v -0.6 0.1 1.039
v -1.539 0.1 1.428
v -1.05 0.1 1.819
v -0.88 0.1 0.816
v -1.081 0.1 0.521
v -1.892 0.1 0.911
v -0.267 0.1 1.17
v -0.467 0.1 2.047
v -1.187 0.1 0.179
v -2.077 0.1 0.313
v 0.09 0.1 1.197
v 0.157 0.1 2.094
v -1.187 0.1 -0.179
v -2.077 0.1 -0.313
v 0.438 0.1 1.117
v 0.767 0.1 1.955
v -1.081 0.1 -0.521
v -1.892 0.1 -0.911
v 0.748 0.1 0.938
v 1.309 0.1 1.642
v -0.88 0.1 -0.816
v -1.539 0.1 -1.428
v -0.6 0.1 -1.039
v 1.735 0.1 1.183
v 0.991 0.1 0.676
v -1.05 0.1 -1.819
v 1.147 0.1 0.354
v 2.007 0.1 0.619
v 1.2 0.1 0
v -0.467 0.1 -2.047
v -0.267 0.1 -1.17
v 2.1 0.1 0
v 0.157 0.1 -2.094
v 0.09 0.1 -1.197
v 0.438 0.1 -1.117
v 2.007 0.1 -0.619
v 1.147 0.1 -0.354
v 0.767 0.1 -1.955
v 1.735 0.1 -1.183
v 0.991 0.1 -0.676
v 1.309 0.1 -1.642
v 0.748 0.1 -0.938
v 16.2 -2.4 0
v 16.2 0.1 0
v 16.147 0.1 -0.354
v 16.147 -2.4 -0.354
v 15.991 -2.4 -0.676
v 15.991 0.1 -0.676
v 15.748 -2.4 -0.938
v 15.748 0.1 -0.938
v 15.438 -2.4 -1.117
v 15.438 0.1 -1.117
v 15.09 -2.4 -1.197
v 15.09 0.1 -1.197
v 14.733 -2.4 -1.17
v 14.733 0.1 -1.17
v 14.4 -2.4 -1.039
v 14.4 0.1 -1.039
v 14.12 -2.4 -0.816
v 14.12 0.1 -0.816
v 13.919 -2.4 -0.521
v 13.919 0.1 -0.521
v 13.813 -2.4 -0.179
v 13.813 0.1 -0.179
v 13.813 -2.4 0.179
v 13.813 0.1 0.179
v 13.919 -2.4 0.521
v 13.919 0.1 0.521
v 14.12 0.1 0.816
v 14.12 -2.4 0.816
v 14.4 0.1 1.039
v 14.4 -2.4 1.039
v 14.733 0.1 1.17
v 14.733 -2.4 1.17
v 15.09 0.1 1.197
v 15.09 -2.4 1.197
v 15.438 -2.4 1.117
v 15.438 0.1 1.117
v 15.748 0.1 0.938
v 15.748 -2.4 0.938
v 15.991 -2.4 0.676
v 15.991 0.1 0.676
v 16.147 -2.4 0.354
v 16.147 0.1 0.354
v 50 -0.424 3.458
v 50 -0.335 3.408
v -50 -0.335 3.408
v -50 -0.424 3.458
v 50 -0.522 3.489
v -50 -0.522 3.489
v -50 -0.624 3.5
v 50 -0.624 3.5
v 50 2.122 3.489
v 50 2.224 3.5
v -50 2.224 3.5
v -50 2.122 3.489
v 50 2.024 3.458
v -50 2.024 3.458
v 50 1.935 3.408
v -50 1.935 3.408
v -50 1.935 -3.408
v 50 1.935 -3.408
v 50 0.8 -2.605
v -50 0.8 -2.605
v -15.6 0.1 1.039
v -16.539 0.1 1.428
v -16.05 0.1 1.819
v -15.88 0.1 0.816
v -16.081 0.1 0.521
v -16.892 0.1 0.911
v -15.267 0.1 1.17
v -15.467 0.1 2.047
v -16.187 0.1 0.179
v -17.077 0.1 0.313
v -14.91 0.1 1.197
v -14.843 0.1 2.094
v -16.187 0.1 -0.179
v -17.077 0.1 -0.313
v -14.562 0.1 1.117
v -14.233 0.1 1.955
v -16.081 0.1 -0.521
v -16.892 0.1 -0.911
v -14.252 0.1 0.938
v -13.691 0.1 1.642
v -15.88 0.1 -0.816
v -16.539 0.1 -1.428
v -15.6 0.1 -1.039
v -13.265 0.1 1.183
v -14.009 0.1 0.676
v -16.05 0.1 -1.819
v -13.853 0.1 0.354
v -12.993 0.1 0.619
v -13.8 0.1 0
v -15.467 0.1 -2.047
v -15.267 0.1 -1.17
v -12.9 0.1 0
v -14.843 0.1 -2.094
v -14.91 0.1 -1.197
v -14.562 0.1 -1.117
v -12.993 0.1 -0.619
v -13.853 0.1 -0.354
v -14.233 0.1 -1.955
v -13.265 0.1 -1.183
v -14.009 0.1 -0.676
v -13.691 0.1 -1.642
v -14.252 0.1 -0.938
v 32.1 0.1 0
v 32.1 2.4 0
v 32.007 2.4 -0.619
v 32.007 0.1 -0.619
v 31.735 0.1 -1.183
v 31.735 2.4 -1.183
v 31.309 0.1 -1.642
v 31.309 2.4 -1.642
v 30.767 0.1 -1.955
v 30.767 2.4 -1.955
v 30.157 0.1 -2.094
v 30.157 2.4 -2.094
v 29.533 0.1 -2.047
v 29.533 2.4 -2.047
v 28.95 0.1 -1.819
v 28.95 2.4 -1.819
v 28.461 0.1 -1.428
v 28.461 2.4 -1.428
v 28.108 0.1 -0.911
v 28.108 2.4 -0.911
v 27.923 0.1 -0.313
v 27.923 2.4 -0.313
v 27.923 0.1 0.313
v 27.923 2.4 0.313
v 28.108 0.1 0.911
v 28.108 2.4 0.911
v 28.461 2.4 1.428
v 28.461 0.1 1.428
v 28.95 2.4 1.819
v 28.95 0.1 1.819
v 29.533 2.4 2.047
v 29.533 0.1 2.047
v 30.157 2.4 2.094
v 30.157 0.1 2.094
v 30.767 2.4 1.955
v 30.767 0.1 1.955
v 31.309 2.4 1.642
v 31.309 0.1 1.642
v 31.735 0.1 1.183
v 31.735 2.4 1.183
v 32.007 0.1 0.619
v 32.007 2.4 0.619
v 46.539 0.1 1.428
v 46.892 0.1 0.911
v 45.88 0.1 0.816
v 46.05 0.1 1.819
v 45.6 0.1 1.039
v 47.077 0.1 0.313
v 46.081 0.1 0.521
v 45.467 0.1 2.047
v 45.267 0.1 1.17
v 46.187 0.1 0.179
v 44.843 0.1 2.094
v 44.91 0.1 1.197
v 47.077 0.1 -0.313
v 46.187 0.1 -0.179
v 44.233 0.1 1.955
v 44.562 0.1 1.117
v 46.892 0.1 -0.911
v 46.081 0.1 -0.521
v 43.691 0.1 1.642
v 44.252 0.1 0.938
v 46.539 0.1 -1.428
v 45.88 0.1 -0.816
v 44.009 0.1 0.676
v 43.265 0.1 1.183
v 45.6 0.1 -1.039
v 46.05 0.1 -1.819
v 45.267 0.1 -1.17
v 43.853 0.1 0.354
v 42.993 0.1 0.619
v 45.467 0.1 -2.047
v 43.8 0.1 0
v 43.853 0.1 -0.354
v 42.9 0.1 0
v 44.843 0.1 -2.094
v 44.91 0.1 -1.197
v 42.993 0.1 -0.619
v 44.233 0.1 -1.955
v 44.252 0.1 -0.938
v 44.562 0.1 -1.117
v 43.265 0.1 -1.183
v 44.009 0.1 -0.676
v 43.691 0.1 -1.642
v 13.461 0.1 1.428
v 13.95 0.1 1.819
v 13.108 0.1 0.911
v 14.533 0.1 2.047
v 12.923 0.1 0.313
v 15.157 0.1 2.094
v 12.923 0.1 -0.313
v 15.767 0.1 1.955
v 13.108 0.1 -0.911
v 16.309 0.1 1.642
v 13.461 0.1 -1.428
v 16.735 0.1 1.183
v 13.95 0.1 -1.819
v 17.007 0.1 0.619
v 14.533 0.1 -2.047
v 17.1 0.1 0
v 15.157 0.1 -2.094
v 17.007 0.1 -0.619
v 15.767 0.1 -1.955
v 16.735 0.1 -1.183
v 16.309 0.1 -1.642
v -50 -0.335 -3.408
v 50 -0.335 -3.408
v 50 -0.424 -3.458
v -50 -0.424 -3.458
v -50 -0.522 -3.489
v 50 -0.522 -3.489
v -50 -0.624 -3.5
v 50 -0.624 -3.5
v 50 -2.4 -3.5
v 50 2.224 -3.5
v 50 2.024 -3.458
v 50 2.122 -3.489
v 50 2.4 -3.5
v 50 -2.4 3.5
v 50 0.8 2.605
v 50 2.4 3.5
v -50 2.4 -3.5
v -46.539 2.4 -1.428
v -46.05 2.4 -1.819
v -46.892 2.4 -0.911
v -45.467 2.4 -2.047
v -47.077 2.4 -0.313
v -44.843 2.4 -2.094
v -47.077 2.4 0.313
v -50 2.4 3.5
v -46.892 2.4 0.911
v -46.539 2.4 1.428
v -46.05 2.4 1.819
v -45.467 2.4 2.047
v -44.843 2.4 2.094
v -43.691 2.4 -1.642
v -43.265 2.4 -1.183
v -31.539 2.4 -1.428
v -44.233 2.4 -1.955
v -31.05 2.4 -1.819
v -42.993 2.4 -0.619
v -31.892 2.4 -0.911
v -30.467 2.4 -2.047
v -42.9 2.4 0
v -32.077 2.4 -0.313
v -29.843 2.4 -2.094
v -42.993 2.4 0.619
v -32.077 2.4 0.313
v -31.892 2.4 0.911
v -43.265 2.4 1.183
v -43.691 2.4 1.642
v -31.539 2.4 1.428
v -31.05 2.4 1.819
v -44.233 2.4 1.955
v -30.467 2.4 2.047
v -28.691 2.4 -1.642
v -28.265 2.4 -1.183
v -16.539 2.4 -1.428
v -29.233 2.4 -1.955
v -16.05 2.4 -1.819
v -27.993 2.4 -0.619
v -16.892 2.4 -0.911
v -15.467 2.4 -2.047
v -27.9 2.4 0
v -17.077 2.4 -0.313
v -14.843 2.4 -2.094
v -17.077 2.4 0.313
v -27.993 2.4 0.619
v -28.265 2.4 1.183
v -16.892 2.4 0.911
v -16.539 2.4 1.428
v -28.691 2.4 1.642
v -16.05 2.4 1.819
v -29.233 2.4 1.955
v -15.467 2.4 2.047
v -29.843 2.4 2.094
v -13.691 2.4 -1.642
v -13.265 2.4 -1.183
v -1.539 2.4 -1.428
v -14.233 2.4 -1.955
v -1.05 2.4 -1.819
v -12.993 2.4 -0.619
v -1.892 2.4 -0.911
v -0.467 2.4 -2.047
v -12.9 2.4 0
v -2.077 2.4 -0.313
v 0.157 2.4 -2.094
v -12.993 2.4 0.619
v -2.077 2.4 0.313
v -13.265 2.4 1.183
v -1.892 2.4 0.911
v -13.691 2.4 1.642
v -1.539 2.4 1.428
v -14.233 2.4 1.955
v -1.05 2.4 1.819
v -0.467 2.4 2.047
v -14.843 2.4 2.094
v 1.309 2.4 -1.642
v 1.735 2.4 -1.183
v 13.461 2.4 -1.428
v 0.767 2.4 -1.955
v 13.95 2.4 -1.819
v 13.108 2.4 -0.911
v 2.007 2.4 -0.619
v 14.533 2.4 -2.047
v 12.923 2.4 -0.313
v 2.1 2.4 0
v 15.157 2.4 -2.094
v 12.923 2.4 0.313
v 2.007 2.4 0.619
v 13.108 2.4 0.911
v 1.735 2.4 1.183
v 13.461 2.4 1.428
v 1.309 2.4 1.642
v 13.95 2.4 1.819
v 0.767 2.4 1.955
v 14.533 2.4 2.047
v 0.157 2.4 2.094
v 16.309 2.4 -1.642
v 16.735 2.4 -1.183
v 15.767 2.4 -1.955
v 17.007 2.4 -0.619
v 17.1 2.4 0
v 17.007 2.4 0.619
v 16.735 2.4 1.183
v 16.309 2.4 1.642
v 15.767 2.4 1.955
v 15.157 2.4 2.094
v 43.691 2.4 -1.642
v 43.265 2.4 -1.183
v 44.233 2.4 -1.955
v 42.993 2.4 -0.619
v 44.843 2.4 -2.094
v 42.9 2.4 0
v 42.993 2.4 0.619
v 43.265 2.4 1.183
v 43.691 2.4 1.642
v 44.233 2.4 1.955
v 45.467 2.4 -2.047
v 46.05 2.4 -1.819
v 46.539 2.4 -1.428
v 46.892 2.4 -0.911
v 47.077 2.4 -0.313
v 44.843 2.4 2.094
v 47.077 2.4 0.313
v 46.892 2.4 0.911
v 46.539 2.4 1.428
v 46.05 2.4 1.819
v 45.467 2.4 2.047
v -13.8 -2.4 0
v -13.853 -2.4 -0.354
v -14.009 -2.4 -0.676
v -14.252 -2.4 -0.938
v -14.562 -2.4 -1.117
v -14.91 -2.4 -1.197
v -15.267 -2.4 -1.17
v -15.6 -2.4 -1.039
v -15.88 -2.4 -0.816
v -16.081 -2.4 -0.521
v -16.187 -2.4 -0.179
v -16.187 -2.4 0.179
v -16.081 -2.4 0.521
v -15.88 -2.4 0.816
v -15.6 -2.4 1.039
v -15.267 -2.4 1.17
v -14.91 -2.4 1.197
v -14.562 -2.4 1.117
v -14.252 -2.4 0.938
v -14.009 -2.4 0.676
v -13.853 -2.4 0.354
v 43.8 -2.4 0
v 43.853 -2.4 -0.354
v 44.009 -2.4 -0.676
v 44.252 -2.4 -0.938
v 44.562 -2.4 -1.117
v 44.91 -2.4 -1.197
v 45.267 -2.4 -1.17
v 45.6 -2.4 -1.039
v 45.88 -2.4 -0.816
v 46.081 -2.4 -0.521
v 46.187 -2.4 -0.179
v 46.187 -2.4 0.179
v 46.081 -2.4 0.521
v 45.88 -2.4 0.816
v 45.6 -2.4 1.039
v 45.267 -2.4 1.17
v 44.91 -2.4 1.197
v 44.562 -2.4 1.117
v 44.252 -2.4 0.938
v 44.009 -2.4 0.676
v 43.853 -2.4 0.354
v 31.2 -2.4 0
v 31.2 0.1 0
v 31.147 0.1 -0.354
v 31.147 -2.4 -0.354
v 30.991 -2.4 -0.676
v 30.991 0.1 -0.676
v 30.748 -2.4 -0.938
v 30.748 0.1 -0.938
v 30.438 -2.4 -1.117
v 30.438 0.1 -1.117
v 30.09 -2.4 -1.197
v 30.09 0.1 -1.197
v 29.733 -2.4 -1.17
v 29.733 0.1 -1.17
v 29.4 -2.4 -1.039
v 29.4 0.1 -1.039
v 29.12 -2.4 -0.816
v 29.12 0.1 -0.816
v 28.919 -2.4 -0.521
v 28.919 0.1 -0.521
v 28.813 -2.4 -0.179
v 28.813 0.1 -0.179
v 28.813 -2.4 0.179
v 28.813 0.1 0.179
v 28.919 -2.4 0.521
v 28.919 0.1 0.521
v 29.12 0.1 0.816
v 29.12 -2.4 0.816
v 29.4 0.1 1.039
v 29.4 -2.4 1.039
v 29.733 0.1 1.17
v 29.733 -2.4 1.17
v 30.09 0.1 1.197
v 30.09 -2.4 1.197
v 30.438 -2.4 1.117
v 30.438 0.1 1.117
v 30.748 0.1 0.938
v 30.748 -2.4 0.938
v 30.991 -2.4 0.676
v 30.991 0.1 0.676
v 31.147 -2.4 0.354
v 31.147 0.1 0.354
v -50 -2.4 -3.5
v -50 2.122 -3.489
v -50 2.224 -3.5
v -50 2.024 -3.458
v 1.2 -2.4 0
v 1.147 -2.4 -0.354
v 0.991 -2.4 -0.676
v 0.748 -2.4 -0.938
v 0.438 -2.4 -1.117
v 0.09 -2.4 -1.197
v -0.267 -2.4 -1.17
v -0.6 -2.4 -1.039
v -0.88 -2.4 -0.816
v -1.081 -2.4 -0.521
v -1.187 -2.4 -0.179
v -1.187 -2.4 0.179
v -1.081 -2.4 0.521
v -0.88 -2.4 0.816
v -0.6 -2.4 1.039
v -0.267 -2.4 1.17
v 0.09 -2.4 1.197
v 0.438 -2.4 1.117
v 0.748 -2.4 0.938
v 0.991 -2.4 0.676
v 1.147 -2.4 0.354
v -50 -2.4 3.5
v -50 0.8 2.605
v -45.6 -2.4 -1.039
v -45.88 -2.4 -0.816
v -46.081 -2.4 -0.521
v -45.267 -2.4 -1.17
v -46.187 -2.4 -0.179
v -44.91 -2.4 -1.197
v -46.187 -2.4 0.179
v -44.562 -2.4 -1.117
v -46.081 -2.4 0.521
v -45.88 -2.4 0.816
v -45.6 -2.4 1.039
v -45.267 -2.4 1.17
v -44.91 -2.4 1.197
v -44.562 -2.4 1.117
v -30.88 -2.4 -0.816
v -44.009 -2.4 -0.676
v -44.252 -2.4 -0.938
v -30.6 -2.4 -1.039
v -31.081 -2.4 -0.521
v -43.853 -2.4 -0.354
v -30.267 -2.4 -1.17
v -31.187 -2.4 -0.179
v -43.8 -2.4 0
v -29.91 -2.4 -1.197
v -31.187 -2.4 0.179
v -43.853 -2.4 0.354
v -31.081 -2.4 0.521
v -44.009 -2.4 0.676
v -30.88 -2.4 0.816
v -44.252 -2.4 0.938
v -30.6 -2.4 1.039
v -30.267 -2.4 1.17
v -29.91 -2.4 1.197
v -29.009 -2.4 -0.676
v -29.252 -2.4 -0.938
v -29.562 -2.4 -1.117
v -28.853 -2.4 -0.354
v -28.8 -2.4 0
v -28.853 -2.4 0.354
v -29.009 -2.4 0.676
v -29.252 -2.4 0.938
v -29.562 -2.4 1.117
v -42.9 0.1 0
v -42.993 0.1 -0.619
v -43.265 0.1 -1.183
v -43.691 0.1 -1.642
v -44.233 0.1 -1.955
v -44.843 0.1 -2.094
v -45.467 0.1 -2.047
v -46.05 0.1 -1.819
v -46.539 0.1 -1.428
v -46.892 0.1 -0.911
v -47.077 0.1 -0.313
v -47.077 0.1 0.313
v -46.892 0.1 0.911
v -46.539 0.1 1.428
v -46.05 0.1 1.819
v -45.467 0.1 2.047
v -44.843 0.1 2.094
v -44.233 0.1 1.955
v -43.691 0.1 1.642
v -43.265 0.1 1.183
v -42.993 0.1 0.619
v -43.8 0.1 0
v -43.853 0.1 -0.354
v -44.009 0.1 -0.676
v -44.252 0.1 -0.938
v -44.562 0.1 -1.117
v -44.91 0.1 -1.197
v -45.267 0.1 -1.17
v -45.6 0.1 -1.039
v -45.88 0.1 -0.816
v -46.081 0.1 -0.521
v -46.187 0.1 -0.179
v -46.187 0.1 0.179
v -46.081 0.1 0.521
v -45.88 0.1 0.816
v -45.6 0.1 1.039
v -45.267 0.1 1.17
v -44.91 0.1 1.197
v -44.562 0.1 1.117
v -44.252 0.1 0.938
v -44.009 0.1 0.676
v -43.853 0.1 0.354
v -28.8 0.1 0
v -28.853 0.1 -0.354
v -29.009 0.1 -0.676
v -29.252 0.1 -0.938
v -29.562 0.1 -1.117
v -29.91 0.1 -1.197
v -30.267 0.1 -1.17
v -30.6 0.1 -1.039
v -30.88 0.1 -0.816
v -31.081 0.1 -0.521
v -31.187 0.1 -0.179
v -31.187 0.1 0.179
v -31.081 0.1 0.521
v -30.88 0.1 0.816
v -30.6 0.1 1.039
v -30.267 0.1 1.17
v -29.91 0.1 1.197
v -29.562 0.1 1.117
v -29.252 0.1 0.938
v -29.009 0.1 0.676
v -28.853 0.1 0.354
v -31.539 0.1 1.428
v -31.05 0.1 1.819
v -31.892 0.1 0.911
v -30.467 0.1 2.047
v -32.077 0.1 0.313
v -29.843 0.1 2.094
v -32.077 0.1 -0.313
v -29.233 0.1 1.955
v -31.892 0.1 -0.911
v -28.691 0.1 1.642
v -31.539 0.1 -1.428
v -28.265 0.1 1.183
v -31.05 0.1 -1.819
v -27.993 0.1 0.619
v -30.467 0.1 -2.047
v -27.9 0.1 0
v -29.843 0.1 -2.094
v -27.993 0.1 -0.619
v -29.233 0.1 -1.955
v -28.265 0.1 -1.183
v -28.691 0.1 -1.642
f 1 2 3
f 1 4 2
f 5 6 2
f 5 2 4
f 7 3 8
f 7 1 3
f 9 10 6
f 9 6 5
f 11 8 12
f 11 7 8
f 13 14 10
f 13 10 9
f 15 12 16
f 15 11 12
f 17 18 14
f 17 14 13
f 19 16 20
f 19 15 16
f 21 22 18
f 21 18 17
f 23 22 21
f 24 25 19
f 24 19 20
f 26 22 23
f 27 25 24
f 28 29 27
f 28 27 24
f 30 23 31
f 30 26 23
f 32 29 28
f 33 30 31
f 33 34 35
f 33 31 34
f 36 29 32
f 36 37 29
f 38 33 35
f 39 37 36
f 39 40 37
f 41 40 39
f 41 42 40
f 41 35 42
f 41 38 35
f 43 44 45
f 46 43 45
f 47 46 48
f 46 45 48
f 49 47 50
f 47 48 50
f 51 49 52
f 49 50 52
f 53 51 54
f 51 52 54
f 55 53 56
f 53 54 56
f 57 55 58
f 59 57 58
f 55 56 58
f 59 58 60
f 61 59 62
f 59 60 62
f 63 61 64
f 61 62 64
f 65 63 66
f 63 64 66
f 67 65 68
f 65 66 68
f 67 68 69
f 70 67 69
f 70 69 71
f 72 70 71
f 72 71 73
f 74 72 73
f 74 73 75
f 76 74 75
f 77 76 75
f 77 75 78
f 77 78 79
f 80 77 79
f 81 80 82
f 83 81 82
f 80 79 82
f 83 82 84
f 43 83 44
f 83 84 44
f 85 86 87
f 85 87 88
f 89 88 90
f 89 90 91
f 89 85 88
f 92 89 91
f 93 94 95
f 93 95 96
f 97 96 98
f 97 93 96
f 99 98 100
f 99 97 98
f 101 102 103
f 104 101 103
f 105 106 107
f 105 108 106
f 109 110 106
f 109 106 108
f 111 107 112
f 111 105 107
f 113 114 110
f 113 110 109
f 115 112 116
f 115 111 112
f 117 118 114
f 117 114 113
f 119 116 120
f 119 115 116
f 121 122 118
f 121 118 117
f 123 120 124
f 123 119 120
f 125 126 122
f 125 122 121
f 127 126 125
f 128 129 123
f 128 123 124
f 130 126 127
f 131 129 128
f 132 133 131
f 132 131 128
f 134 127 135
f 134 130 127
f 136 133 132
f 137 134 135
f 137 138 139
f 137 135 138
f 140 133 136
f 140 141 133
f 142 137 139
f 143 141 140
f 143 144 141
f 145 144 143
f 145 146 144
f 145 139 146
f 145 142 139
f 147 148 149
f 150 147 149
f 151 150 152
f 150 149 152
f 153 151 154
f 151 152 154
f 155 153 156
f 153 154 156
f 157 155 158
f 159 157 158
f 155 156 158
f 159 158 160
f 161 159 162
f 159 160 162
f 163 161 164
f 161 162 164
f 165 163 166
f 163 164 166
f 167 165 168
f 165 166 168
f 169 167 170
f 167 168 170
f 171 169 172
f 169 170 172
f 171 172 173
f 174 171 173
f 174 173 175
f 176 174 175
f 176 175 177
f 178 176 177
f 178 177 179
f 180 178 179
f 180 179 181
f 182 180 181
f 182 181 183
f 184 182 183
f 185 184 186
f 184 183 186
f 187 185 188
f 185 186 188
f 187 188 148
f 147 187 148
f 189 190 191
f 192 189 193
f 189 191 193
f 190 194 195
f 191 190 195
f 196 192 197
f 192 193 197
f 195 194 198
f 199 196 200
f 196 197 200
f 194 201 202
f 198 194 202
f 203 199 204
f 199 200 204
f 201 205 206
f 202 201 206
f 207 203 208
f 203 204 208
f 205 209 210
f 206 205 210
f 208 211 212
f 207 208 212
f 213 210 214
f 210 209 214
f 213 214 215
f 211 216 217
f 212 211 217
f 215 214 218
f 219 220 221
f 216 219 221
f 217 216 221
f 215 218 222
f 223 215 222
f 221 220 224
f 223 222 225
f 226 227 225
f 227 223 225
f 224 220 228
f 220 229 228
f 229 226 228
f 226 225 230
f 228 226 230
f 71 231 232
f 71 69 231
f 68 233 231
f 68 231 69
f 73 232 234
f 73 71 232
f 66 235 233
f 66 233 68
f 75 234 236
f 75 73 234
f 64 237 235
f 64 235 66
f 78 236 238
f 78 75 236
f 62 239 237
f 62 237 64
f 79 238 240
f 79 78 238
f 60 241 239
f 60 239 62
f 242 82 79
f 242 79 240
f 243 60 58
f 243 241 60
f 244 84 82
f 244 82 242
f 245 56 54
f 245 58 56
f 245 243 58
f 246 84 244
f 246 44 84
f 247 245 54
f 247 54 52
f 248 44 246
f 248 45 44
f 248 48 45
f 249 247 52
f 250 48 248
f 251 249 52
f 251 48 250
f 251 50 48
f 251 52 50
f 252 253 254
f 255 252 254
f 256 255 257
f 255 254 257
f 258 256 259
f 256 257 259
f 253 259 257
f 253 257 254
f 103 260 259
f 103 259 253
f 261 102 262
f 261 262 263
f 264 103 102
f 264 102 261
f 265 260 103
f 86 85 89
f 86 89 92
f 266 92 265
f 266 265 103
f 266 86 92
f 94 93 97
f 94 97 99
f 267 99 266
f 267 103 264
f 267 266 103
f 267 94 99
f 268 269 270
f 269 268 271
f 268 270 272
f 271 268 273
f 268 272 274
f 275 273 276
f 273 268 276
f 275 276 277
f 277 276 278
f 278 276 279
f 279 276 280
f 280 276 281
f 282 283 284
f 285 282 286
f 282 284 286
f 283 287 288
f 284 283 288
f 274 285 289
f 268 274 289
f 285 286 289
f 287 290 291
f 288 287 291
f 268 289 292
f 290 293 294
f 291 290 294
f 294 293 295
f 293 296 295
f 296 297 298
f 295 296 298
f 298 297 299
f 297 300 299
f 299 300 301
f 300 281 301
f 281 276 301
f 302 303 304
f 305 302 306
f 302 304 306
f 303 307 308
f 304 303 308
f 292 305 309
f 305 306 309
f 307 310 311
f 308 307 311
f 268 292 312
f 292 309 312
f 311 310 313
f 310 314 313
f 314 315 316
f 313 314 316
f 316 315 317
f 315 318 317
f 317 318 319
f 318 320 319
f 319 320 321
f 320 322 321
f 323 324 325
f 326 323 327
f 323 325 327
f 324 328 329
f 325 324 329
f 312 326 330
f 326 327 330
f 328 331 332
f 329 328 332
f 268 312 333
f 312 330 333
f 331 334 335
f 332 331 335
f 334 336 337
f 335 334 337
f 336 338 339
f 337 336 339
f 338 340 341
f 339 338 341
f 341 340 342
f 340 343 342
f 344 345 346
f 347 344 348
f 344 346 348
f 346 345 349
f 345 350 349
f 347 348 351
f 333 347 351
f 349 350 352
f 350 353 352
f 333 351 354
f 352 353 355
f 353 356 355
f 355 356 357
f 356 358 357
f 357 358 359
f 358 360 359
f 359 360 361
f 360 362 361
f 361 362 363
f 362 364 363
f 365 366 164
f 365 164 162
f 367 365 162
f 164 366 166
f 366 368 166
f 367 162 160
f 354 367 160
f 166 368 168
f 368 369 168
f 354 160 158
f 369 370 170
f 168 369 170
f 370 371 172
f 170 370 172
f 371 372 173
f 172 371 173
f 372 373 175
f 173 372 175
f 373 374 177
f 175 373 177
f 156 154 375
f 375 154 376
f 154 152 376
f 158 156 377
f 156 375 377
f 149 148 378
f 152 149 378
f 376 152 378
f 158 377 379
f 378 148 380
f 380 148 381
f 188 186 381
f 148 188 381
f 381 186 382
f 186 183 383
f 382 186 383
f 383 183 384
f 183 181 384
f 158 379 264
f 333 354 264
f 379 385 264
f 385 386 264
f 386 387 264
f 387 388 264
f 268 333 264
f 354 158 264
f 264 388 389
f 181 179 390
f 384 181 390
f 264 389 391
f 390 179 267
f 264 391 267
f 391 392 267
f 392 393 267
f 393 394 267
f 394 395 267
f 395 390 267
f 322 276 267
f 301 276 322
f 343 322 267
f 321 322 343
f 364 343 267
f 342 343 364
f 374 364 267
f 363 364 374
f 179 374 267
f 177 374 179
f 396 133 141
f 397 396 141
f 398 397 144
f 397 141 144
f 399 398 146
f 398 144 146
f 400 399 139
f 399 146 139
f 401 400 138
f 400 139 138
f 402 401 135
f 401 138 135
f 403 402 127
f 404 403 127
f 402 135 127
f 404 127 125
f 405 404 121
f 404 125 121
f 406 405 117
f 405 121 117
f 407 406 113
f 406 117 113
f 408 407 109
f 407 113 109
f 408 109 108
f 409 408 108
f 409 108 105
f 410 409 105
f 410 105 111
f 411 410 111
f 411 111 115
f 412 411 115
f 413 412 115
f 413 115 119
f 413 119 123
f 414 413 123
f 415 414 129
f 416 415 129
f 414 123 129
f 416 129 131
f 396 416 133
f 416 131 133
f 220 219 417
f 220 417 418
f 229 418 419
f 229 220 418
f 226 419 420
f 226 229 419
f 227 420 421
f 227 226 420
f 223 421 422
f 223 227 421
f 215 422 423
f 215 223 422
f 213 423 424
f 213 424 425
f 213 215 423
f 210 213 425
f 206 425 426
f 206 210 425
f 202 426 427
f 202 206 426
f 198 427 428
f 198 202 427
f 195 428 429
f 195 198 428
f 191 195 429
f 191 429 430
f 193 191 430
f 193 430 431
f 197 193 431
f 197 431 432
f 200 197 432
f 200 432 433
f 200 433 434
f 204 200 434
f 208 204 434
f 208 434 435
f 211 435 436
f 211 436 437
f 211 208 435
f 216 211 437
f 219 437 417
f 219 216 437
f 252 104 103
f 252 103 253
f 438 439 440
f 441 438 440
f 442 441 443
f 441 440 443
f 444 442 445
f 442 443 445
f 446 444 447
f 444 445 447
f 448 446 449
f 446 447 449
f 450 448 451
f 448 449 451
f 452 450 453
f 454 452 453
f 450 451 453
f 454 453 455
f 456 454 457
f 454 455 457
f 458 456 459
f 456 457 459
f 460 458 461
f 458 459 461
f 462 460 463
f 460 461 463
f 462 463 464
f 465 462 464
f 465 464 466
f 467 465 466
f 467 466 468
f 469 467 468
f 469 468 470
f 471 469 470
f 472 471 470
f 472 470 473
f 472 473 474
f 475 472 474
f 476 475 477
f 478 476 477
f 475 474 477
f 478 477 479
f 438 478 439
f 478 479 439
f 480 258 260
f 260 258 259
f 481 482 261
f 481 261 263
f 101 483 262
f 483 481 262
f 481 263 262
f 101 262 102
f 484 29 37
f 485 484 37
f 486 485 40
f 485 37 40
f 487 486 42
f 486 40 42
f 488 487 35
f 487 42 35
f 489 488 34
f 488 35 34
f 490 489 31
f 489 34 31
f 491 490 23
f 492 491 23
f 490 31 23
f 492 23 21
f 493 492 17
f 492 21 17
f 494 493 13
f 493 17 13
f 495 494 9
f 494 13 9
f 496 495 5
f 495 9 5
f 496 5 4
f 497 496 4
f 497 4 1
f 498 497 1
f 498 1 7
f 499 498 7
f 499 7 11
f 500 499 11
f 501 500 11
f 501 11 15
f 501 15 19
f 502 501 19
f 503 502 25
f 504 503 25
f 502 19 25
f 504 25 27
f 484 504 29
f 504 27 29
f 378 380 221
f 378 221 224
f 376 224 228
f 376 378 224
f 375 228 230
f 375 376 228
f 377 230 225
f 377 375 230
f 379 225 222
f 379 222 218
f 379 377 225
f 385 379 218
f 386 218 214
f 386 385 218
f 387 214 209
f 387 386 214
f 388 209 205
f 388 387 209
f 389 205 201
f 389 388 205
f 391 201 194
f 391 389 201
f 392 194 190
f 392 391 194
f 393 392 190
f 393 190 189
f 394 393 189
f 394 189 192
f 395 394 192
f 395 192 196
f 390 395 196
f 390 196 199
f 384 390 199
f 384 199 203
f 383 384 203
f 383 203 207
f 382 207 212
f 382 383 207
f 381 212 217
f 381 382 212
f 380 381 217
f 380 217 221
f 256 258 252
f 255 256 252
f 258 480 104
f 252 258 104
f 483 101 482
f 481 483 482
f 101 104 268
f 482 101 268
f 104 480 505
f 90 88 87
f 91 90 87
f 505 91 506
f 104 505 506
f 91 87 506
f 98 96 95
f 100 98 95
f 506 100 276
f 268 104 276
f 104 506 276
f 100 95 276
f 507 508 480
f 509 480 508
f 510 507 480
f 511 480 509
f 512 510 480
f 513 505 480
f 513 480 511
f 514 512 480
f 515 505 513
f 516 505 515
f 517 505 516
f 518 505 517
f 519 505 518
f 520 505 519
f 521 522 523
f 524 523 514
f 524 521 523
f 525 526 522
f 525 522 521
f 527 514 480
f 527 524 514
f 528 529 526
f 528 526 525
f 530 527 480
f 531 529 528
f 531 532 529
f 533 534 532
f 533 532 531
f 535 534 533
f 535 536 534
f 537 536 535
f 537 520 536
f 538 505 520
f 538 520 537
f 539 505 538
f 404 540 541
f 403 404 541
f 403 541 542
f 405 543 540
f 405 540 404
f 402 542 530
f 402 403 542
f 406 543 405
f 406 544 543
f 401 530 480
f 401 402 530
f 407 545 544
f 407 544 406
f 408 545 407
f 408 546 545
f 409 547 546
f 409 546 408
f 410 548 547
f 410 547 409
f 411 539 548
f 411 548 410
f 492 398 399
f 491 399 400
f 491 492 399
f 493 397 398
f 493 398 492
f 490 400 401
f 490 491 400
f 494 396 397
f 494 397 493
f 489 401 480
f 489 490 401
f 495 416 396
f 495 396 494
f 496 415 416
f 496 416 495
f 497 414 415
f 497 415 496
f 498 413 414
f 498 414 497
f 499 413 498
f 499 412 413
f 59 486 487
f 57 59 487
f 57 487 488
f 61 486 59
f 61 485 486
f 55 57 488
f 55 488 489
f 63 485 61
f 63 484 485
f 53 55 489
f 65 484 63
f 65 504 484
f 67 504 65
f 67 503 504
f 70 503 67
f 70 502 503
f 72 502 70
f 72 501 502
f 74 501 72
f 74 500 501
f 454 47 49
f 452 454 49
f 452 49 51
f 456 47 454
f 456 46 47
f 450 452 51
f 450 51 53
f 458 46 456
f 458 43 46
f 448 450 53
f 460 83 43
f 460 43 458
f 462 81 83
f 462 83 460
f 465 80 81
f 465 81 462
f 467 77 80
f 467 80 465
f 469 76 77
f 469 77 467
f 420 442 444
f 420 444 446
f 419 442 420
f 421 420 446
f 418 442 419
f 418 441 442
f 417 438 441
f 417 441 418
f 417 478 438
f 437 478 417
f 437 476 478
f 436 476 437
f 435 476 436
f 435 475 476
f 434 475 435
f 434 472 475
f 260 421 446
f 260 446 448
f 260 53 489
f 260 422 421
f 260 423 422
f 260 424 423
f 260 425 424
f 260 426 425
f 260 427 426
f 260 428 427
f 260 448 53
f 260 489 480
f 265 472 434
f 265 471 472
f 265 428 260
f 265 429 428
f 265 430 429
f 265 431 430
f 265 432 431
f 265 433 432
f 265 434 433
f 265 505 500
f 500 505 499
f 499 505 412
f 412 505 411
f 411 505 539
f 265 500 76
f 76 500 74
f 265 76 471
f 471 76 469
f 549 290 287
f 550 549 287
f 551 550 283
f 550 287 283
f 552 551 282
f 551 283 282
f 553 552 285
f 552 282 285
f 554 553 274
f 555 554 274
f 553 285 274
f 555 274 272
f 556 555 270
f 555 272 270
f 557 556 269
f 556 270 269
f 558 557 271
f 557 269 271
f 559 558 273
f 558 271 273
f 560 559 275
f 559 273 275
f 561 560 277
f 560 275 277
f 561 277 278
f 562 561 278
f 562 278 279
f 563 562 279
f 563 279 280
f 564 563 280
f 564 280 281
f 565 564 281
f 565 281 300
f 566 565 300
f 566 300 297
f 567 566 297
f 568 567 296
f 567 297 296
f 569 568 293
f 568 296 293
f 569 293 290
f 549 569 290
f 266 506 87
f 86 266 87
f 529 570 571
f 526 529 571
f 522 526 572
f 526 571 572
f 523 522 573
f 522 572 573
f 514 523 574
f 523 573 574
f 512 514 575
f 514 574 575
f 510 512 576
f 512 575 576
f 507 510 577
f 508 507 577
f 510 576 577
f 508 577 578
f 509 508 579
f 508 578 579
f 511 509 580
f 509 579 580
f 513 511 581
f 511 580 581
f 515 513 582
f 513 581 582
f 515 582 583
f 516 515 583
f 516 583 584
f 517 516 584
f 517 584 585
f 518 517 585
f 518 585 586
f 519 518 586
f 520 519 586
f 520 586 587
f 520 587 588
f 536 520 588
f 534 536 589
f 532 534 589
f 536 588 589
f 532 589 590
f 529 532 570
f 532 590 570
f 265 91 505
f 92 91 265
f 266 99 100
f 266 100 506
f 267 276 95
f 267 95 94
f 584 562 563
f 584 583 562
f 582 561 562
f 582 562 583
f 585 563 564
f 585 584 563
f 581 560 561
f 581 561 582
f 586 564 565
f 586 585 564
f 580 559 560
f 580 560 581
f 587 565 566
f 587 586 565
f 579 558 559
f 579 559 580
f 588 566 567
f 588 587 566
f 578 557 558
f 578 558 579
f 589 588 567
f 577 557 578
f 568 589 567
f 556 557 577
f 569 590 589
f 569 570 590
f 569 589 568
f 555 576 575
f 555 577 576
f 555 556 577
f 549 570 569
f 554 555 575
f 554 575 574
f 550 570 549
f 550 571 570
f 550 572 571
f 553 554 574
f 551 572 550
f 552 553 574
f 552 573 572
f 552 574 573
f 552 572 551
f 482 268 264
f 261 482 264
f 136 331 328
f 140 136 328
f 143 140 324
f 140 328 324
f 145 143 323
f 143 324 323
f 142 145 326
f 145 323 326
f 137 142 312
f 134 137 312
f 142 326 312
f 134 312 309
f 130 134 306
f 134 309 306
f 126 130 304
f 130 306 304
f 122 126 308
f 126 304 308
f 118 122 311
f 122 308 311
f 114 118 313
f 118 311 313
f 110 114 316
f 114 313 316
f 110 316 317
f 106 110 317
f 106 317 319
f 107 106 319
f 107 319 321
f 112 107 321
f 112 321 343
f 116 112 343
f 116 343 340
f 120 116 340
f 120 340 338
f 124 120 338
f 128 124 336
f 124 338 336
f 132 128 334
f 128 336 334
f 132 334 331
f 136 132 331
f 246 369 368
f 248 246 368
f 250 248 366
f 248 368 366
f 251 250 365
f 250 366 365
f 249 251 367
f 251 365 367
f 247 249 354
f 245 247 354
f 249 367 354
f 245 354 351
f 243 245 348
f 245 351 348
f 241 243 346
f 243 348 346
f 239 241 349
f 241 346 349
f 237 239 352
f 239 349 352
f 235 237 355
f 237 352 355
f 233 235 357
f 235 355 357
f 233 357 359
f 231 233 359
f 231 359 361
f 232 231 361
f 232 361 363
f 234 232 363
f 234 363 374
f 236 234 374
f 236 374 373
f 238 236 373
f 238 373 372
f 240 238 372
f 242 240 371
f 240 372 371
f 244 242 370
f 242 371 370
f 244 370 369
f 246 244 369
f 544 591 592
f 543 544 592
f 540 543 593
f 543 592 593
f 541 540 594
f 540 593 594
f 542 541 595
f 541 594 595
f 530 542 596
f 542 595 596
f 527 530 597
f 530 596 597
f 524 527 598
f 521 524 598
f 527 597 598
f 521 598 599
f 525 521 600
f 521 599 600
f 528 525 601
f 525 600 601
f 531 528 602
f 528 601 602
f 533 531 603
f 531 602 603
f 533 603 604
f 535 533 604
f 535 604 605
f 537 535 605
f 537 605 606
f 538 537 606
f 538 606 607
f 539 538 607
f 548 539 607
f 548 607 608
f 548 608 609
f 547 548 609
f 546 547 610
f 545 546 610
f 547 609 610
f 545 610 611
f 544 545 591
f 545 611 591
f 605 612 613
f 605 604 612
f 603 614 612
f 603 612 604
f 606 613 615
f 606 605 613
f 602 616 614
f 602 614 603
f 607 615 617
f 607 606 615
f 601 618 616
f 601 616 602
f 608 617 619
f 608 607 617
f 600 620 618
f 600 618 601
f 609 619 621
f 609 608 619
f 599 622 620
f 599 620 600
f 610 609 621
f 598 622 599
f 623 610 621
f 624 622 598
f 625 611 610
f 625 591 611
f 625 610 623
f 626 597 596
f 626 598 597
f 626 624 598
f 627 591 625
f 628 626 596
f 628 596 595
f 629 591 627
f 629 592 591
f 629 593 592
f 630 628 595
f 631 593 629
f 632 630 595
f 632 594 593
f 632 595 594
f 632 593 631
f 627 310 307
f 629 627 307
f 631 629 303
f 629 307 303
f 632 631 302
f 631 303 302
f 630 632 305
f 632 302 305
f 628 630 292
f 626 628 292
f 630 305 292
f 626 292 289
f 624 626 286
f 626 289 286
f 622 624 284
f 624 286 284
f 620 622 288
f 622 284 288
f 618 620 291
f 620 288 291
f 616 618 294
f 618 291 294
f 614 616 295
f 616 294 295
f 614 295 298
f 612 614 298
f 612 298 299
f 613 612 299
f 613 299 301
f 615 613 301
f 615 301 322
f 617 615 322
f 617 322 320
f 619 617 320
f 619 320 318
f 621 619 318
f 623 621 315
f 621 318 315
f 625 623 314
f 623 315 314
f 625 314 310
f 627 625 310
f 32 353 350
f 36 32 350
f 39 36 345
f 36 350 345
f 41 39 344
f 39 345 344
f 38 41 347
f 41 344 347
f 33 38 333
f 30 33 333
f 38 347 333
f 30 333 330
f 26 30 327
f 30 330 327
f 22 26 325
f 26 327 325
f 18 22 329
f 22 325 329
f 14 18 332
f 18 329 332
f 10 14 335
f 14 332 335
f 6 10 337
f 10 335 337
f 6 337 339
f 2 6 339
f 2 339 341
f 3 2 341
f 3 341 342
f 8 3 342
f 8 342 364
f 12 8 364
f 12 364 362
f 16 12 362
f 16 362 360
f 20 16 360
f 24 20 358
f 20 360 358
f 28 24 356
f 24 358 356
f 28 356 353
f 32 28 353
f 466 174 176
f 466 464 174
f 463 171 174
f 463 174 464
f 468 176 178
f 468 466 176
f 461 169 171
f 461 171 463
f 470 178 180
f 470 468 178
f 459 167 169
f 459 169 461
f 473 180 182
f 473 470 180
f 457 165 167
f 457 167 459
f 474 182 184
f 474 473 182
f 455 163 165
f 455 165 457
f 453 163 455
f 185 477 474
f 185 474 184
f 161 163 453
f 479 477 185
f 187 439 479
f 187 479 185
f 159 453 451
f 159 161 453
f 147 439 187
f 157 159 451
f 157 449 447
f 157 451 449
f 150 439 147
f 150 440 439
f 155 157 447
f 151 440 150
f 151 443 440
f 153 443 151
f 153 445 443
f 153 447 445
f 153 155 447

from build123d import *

# Parameters (mm, degrees)
SKETCH_1_W             = 100
SKETCH_1_H             = 4.8
EXTRUDE_1_DEPTH        = 3.5
SKETCH_3_R             = 2.1
CUT_EXTRUDE_1_DEPTH    = 2.3
SKETCH_4_R             = 1.2
CUT_EXTRUDE_2_DEPTH    = 2.5
CUT_EXTRUDE_START      = -101
CUT_EXTRUDE_4_DEPTH    = 102
PATTERN_LINEAR_1_COUNT = 6
PATTERN_LINEAR_1_PITCH = 15


with BuildPart() as part:
    # 草图1 → 凸台-拉伸1 (new body, symmetric)
    with BuildSketch(Plane.XY):
        Rectangle(SKETCH_1_W, SKETCH_1_H)
    extrude(amount=EXTRUDE_1_DEPTH, both=True)

    # 草图3 → 切除-拉伸1 (cut)
    with BuildSketch(Plane(origin=(0, 2.4, 0), x_dir=(1, 0, 0), z_dir=(0, 1, 0))):
        with Locations((-45, 0)):
            Circle(SKETCH_3_R)
    cut_extrude_1 = extrude(amount=-CUT_EXTRUDE_1_DEPTH, mode=Mode.SUBTRACT)

    # 草图4 → 切除-拉伸2 (cut)
    with BuildSketch(Plane(origin=(0, 0.1, 0), x_dir=(1, 0, 0), z_dir=(0, 1, 0))):
        with Locations((-45, 0)):
            Circle(SKETCH_4_R)
    cut_extrude_2 = extrude(amount=-CUT_EXTRUDE_2_DEPTH, mode=Mode.SUBTRACT)

    # 镜向1: 切除-拉伸1, 切除-拉伸2 across plane
    add(cut_extrude_1.mirror(Plane(origin=(0, 0, 0), x_dir=(0, 0, 1), z_dir=(1, 0, 0))), mode=Mode.SUBTRACT)
    add(cut_extrude_2.mirror(Plane(origin=(0, 0, 0), x_dir=(0, 0, 1), z_dir=(1, 0, 0))), mode=Mode.SUBTRACT)

    # 草图6 → 切除-拉伸4 (cut)
    with BuildSketch(Plane.ZY.offset(50).offset(CUT_EXTRUDE_START)):
        with BuildLine():
            Line((3.5, 29.375276139), (3.5, 2.4))
            Line((3.5, 2.4), (3.5, 2.223915661))
            ThreePointArc((3.5, 2.223915661), (3.476466019, 2.072323667), (3.408079469, 1.935001925))
            Line((3.408079469, 1.935001925), (2.604516262, 0.8))
            Line((2.604516262, 0.8), (3.408079469, -0.335001925))
            ThreePointArc((3.408079469, -0.335001925), (3.476466019, -0.472323667), (3.5, -0.623915661))
            Line((3.5, -0.623915661), (3.5, -27.5991918))
            Line((3.5, -27.5991918), (57.450552278, -27.5991918))
            Line((57.450552278, -27.5991918), (57.450552278, 29.375276139))
            Line((57.450552278, 29.375276139), (3.5, 29.375276139))
        make_face()
    cut_extrude_4 = extrude(amount=CUT_EXTRUDE_4_DEPTH, mode=Mode.SUBTRACT)

    # 镜向3: 切除-拉伸4 across plane
    add(cut_extrude_4.mirror(Plane.XY), mode=Mode.SUBTRACT)

    # 阵列(线性)1: 切除-拉伸1, 切除-拉伸2 ×6
    with Locations(*[(i * PATTERN_LINEAR_1_PITCH, 0, 0) for i in range(1, PATTERN_LINEAR_1_COUNT)]):
        add(cut_extrude_1, mode=Mode.SUBTRACT)
        add(cut_extrude_2, mode=Mode.SUBTRACT)


solid = part.part
